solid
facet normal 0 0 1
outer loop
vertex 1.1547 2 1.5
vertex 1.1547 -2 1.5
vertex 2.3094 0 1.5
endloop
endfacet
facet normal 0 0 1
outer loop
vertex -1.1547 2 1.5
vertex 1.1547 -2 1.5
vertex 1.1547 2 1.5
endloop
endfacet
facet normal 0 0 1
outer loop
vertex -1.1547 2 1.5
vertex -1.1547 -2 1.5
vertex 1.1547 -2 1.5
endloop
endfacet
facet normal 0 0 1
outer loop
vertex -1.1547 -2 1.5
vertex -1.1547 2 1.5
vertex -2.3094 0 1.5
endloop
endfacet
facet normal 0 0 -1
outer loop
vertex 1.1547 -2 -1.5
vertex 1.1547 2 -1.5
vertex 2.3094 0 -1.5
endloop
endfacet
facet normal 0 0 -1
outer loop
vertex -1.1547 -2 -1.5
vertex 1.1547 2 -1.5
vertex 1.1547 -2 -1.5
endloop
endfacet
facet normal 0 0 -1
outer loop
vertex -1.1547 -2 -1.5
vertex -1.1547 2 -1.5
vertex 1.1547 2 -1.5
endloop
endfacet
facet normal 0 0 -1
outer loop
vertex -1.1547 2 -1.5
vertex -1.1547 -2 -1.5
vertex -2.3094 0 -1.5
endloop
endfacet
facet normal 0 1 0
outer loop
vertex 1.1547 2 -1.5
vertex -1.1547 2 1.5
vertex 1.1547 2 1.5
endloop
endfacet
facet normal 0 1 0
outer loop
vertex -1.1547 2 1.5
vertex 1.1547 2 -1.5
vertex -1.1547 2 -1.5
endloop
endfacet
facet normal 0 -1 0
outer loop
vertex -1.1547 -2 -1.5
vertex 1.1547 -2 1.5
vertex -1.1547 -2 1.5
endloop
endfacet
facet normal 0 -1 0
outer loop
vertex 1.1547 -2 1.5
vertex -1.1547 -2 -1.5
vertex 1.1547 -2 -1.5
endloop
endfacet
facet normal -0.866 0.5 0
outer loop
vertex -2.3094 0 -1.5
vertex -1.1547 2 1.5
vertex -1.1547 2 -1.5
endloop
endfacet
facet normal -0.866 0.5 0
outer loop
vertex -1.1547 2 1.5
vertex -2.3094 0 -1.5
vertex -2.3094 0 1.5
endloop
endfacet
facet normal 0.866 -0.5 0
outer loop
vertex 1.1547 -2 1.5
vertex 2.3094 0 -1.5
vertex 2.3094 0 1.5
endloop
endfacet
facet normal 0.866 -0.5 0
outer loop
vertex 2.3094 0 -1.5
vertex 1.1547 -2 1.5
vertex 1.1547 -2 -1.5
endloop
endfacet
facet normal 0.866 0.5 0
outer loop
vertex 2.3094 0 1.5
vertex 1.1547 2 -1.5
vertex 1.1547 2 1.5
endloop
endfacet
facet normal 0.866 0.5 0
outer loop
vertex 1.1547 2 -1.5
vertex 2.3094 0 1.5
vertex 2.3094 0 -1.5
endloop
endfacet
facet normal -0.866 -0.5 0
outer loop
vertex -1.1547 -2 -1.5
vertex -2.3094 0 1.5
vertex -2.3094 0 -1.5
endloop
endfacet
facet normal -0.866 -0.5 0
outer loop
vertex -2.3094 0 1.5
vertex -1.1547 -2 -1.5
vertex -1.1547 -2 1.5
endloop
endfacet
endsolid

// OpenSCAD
// intersection_for
intersection_for (i = [0:2]) rotate([0, 0, i * 60]) cube([10, 4, 3], center = true);
